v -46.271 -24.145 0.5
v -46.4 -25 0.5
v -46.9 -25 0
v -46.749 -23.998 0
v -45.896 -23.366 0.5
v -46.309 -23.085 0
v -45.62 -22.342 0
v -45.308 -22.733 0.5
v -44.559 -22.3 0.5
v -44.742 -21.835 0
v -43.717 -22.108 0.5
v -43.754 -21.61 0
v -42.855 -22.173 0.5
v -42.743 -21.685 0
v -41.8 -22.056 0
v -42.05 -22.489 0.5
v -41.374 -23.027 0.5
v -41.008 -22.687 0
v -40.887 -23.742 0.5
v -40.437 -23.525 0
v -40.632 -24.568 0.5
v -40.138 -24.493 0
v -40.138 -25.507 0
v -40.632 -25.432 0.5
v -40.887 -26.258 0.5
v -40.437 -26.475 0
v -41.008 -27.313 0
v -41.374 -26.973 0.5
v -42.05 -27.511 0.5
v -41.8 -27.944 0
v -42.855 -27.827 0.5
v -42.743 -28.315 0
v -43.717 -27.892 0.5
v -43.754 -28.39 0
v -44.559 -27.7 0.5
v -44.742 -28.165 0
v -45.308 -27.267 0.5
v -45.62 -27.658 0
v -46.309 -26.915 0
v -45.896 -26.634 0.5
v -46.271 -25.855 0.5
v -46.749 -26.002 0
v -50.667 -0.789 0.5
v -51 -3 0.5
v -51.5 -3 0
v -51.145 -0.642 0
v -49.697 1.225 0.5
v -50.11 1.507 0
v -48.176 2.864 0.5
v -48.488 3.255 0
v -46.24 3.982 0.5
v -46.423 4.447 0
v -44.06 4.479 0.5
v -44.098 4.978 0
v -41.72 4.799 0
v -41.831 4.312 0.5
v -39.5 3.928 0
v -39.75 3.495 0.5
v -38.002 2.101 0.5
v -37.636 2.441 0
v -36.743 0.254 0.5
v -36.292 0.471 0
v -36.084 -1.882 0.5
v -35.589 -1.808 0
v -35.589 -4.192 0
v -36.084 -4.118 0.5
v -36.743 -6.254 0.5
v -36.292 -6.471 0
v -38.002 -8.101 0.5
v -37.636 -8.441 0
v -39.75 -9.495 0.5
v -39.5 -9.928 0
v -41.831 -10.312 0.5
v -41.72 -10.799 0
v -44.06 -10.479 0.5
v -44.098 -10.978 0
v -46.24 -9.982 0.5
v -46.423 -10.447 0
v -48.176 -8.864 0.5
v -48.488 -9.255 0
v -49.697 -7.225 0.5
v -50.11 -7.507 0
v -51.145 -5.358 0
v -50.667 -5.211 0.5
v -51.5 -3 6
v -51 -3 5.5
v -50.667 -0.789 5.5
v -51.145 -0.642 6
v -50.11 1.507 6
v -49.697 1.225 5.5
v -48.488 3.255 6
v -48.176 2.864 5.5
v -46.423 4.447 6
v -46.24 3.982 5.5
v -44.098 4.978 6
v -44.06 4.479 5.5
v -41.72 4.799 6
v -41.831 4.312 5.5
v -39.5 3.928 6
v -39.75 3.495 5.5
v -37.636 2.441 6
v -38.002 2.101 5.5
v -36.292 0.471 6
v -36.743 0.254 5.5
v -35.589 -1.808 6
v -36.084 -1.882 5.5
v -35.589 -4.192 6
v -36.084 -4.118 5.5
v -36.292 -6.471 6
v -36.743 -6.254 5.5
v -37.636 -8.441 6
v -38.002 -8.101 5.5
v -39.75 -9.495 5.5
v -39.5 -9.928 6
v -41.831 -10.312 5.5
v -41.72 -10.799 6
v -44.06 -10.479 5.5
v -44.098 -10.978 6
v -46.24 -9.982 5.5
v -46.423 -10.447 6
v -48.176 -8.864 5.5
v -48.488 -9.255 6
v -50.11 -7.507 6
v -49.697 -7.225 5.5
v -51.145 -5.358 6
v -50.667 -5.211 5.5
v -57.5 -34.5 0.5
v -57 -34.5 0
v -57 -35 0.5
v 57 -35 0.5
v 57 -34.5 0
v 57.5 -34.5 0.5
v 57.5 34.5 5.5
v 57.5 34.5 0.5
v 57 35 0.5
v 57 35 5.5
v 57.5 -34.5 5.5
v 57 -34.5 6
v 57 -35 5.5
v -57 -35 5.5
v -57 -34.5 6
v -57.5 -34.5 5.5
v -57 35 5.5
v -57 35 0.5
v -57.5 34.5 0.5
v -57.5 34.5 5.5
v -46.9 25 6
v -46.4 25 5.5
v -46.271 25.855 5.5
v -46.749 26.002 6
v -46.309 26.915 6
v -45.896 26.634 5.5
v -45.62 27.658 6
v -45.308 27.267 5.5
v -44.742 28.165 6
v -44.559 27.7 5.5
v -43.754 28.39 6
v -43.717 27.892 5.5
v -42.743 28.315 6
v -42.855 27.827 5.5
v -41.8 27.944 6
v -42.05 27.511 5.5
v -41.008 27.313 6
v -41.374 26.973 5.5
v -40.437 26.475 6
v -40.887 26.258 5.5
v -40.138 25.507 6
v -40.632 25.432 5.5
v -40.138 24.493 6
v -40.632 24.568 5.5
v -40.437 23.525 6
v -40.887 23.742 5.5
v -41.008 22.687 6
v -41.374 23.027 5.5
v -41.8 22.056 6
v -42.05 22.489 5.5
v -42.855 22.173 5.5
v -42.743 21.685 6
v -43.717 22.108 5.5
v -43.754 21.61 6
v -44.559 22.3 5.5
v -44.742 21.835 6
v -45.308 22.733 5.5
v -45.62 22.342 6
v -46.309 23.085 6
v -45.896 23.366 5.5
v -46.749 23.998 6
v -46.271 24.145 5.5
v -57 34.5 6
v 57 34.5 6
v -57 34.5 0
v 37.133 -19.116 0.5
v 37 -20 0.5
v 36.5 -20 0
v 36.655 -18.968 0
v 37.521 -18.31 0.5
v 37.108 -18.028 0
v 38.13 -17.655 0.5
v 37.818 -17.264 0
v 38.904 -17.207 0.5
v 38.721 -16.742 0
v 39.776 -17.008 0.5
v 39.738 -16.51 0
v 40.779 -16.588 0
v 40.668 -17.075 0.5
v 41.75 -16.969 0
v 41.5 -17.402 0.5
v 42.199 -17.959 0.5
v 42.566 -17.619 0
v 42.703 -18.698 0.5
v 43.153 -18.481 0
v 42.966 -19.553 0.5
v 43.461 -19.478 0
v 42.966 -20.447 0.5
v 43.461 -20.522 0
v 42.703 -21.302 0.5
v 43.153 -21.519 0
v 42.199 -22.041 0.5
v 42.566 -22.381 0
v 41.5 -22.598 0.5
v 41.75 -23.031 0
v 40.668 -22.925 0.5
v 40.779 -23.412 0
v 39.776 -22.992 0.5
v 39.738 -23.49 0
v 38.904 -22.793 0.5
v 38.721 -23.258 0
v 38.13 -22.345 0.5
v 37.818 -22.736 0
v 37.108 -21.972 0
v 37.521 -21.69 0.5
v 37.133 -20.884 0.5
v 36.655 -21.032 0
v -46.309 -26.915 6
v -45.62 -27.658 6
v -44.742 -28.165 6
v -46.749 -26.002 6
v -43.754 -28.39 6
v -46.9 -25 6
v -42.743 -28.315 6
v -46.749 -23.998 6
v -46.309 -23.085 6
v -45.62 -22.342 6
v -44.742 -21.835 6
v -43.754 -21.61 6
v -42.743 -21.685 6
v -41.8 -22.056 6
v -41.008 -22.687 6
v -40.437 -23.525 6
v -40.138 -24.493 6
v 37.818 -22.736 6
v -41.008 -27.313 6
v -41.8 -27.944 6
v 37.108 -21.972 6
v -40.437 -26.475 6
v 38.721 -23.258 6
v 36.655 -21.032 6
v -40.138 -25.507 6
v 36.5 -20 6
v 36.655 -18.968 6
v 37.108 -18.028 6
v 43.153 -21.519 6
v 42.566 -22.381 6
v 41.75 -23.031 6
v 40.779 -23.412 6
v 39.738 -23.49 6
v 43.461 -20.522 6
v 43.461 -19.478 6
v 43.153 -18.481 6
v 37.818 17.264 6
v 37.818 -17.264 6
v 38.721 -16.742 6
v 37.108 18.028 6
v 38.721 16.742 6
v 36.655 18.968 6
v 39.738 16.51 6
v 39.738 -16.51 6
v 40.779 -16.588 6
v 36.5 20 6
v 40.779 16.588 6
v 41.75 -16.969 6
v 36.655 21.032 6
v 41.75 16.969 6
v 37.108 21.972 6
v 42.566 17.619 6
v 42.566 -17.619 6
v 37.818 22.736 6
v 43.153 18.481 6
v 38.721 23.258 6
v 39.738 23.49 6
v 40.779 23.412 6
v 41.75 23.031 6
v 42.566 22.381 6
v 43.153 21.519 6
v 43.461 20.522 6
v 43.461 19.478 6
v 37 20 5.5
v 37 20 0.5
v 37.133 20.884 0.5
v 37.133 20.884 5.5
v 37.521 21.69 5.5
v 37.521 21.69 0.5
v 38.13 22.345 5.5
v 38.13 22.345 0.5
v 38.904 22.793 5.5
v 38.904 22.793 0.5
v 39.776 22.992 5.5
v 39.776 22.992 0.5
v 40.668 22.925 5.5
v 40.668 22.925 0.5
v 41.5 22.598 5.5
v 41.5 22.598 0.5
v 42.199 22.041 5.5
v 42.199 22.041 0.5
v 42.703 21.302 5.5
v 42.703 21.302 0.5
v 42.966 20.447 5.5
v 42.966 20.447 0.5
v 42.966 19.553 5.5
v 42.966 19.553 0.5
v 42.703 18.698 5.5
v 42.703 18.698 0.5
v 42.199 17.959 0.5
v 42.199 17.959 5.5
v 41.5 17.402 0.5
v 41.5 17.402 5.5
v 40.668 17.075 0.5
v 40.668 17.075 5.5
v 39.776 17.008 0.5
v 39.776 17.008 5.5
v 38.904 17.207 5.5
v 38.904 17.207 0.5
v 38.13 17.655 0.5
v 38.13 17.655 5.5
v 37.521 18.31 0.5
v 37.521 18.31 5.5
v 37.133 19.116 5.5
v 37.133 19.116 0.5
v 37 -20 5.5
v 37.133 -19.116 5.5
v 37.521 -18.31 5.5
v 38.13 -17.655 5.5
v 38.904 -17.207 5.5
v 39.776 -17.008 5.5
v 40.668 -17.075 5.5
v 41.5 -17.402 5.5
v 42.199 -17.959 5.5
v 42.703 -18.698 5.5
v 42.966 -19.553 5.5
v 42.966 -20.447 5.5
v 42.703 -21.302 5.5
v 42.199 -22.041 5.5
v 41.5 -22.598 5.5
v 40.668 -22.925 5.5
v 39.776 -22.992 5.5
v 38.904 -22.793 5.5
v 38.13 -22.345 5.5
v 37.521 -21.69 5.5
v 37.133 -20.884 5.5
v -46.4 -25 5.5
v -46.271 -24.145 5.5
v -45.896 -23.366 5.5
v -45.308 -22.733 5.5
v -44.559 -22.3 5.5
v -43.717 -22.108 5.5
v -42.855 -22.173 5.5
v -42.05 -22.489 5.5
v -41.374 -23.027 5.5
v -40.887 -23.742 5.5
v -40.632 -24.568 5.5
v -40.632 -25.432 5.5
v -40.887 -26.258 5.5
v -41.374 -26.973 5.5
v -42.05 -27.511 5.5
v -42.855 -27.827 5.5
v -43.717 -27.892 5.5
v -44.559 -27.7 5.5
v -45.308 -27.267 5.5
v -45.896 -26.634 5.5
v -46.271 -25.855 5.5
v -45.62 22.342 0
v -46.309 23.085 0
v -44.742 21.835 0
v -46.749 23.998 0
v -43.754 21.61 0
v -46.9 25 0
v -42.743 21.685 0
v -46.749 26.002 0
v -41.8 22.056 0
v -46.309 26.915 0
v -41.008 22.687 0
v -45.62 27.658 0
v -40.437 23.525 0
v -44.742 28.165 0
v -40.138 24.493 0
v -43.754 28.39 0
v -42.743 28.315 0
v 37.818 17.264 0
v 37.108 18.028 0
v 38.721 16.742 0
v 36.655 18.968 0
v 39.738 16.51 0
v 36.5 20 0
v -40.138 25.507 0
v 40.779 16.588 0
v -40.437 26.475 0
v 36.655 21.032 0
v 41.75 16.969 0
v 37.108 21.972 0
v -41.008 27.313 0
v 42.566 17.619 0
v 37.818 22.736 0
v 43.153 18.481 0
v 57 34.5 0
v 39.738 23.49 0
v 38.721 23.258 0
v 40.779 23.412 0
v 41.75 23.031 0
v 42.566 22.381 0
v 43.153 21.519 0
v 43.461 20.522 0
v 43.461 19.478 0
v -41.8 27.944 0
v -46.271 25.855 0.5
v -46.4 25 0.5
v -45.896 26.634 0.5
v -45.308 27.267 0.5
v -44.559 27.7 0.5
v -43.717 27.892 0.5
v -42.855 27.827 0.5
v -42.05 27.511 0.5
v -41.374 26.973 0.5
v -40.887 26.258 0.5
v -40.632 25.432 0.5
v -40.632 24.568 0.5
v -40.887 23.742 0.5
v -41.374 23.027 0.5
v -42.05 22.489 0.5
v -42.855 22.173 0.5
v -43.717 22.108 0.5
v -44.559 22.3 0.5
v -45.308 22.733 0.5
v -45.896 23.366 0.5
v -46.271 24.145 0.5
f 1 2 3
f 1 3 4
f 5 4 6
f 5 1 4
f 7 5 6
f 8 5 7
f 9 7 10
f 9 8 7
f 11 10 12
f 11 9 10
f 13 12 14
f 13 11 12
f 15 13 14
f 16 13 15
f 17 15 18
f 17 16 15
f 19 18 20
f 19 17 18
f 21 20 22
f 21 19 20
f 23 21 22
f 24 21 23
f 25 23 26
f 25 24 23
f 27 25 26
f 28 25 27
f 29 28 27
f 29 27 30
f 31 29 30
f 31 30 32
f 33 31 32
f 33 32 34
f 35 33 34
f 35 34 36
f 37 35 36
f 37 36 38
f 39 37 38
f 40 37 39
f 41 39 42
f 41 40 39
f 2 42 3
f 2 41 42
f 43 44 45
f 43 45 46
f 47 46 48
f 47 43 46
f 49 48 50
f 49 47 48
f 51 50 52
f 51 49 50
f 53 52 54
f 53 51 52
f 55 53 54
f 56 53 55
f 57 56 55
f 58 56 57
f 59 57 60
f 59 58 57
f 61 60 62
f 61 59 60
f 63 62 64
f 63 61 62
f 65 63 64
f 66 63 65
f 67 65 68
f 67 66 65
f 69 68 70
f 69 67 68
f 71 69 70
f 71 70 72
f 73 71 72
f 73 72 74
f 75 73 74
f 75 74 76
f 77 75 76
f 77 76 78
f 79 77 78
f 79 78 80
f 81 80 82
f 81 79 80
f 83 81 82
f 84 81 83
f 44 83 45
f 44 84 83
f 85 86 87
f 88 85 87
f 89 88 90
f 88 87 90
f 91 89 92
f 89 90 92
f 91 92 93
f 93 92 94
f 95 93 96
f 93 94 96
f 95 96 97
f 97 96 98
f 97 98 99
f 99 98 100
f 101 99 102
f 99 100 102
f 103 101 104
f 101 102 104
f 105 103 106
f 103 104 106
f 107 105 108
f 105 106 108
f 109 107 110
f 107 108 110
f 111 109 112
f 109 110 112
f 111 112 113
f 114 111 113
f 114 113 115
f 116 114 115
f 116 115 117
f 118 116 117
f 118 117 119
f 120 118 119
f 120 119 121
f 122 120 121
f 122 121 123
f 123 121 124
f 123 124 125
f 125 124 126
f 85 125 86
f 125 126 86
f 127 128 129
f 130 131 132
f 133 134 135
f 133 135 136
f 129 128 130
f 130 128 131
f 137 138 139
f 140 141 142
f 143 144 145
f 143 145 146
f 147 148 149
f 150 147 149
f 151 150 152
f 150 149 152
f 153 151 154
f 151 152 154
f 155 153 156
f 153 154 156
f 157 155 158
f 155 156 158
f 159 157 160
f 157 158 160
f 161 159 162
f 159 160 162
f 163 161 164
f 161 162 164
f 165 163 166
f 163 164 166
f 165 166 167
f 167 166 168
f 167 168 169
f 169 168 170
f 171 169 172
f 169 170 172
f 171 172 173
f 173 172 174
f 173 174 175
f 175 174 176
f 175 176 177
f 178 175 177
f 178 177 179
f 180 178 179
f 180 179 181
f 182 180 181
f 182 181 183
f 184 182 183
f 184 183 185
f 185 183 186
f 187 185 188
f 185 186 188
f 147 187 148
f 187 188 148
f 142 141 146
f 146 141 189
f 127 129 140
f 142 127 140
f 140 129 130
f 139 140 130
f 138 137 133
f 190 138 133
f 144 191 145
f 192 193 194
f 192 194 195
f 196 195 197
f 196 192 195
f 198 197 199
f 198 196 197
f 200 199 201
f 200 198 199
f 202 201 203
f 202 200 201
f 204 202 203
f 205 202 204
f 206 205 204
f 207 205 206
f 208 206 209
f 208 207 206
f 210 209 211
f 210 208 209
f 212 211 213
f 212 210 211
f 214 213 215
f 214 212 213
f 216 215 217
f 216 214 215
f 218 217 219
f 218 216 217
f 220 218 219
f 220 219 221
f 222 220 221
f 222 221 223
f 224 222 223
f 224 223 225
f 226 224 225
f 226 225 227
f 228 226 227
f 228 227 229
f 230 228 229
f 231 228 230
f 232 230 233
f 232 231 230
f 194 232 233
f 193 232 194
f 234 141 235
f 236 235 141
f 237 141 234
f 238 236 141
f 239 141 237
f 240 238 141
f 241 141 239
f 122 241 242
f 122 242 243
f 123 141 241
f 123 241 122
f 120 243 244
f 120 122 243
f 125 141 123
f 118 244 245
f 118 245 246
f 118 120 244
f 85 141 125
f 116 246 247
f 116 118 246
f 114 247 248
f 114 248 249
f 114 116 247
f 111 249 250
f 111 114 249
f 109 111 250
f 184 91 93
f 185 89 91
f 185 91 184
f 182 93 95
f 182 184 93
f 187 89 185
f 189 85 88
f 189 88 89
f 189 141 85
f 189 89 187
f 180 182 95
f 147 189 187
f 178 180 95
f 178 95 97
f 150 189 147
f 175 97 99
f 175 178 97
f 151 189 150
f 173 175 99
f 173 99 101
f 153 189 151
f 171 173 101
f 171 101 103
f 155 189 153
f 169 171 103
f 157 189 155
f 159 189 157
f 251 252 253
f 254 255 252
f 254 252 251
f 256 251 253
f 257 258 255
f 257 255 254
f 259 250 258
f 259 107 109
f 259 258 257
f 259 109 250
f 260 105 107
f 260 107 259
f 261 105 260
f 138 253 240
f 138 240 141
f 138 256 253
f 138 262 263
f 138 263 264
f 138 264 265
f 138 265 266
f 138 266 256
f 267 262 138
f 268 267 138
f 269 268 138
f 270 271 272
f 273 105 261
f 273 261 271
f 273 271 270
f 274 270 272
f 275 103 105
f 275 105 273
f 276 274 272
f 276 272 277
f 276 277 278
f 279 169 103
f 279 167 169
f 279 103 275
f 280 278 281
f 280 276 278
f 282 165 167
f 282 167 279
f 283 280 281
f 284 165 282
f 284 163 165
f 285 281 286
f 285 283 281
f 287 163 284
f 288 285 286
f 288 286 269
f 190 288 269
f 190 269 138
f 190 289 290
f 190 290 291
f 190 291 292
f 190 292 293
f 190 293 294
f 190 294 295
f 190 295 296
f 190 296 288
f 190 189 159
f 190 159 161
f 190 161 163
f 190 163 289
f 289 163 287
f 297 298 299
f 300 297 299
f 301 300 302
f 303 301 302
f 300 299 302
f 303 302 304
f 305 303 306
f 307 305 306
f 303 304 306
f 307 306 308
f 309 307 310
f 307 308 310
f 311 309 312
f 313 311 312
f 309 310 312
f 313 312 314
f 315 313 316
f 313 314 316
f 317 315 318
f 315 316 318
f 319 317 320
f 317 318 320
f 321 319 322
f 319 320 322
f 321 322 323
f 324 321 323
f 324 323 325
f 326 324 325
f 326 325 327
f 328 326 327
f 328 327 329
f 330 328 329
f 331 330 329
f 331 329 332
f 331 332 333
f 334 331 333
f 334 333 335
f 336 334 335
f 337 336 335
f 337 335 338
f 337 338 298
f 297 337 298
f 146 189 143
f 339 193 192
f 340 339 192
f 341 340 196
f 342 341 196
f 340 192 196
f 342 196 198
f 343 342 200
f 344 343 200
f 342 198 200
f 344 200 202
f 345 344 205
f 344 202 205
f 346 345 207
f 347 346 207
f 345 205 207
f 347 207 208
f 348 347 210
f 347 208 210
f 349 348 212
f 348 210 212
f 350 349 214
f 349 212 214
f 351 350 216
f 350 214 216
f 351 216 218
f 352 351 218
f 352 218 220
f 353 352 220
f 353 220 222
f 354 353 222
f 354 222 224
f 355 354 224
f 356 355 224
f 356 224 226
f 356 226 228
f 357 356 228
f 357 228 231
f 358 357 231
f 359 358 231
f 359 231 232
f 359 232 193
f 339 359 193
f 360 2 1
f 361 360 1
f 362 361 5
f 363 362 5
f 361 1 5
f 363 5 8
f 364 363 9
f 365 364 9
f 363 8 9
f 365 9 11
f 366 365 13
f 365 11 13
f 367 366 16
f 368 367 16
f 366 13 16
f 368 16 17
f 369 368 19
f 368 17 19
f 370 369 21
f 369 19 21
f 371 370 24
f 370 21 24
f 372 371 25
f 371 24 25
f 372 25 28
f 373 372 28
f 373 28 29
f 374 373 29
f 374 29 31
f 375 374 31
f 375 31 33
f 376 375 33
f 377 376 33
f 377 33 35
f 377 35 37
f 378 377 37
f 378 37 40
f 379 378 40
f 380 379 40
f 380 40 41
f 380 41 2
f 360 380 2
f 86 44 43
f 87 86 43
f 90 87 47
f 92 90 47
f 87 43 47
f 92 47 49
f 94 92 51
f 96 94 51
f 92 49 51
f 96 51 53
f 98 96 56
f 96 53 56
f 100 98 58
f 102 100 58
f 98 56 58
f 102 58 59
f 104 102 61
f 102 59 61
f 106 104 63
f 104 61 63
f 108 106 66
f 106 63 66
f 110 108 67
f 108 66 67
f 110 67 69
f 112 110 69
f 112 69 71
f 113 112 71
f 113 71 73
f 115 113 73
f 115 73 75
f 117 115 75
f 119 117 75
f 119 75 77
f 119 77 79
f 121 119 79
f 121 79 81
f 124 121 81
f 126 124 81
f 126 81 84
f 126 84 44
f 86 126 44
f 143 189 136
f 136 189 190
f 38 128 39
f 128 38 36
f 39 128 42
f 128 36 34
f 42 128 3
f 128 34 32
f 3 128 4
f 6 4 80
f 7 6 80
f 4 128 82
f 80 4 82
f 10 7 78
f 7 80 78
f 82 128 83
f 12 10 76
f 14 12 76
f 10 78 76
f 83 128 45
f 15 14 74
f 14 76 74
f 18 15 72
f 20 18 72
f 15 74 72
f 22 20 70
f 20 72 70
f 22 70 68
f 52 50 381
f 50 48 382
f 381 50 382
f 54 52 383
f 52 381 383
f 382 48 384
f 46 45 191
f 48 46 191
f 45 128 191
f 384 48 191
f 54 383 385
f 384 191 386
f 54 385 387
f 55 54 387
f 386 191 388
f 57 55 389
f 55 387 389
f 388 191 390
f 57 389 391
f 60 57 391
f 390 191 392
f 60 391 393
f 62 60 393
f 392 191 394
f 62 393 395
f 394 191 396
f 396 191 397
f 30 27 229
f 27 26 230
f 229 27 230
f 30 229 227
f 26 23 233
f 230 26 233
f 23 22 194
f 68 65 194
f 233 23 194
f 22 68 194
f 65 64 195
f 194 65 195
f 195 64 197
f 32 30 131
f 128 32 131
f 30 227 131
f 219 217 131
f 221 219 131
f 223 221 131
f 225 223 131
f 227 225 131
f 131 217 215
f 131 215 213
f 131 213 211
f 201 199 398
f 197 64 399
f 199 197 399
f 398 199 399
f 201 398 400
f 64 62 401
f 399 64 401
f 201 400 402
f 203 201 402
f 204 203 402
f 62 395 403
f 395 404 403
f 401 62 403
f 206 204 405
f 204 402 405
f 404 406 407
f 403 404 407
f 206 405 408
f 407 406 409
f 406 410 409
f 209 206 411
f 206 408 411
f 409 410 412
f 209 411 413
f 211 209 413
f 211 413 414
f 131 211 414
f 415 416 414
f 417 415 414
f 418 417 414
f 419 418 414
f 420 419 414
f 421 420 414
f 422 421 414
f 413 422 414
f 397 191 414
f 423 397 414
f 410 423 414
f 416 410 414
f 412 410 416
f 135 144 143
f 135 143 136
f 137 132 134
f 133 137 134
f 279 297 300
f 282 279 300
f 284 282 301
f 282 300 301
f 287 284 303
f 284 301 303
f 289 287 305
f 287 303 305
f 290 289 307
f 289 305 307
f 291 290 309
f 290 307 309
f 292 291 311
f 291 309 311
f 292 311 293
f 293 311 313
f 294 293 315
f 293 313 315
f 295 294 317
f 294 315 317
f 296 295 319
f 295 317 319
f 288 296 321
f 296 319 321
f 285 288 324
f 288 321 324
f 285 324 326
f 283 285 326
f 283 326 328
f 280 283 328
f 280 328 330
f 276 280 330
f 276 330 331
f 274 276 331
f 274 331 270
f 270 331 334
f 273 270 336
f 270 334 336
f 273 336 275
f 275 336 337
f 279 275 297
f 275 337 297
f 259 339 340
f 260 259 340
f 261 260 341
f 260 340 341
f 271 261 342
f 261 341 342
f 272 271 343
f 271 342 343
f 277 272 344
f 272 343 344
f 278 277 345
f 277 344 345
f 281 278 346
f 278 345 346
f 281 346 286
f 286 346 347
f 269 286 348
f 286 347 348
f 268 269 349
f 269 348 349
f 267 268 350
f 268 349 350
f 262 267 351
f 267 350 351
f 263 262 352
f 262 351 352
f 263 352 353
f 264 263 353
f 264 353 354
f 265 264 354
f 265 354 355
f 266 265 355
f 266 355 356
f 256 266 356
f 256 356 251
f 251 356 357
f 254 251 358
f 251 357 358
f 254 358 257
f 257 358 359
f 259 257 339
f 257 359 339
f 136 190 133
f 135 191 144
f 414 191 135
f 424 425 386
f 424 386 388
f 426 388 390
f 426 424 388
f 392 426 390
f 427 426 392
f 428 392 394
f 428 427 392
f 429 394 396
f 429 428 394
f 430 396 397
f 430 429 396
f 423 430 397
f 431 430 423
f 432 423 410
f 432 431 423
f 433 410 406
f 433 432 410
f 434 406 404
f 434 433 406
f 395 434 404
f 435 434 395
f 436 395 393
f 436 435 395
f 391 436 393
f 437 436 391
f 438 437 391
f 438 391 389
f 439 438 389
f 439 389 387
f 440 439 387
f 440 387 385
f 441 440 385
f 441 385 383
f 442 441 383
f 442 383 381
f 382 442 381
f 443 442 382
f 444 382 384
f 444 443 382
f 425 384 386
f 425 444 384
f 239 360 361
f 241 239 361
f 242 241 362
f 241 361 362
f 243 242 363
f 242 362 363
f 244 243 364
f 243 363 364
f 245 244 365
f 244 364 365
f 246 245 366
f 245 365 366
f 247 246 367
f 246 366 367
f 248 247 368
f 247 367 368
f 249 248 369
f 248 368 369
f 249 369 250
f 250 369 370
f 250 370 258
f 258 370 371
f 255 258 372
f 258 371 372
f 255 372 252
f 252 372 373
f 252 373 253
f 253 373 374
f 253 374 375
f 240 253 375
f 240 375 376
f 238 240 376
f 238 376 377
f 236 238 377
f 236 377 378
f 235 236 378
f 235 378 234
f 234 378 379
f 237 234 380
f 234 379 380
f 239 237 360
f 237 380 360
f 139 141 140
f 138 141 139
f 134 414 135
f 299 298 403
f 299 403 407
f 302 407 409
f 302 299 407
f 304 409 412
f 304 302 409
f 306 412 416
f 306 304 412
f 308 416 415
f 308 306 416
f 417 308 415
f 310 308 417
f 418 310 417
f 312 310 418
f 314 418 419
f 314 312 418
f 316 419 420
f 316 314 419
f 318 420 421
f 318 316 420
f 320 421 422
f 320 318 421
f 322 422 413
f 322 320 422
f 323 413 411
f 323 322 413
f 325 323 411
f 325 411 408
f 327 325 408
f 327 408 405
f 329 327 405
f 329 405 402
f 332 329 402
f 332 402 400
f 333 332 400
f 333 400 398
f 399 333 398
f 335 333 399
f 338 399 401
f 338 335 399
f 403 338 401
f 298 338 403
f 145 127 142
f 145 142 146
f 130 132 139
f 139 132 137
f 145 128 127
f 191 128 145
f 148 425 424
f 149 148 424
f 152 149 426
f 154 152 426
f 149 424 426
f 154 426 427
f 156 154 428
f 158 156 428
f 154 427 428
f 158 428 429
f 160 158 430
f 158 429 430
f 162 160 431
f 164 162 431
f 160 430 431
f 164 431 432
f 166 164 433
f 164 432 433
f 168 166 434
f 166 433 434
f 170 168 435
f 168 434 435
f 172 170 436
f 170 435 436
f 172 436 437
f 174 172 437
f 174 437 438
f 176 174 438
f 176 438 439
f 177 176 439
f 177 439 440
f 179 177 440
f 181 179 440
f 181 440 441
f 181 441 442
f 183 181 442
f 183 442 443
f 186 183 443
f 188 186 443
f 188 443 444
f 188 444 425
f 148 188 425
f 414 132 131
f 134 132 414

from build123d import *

# Parameters (mm, degrees)
F0_W     = 115
F0_H     = 70
F1_DEPTH = 6
F3_D     = 15
F3_DEPTH = 20
F4_D     = 5.8
F4_DEPTH = 20
F5_D     = 6
F5_DEPTH = 20
F6_SIZE  = 0.5


with BuildPart() as f1:
    # F0 (on Top) → F1 (new body)
    with BuildSketch(Plane.XY):
        Rectangle(F0_W, F0_H)
    extrude(amount=F1_DEPTH)

    # F3
    with Locations(Plane.XY.offset(6)):
        with Locations((-43.5, -3)):
            Hole(F3_D / 2, depth=F3_DEPTH)

    # F4
    with Locations(Plane.XY.offset(6)):
        with Locations((-43.5, 25), (-43.5, -25)):
            Hole(F4_D / 2, depth=F4_DEPTH)

    # F5
    with Locations(Plane.XY.offset(6)):
        with Locations((40, 20), (40, -20)):
            Hole(F5_D / 2, depth=F5_DEPTH)

    # F6
    f6_edges = [f1.edges().sort_by_distance(p)[0] for p in [
        (0, -35, 0),
        (-57.5, 0, 0),
        (57.5, 0, 0),
        (0, 35, 0),
        (-46.4, -25, 0),
        (-51, -3, 0),
        (37, -20, 0),
        (-46.4, 25, 0),
        (37, 20, 0),
        (0, -35, 6),
        (-57.5, 0, 6),
        (57.5, 0, 6),
        (0, 35, 6),
        (-46.4, -25, 6),
        (-51, -3, 6),
        (37, -20, 6),
        (-46.4, 25, 6),
        (37, 20, 6),
        (57.5, 35, 3),
        (57.5, -35, 3),
        (-57.5, -35, 3),
        (-57.5, 35, 3),
    ]]
    chamfer(f6_edges, length=F6_SIZE)


solid = f1.part
